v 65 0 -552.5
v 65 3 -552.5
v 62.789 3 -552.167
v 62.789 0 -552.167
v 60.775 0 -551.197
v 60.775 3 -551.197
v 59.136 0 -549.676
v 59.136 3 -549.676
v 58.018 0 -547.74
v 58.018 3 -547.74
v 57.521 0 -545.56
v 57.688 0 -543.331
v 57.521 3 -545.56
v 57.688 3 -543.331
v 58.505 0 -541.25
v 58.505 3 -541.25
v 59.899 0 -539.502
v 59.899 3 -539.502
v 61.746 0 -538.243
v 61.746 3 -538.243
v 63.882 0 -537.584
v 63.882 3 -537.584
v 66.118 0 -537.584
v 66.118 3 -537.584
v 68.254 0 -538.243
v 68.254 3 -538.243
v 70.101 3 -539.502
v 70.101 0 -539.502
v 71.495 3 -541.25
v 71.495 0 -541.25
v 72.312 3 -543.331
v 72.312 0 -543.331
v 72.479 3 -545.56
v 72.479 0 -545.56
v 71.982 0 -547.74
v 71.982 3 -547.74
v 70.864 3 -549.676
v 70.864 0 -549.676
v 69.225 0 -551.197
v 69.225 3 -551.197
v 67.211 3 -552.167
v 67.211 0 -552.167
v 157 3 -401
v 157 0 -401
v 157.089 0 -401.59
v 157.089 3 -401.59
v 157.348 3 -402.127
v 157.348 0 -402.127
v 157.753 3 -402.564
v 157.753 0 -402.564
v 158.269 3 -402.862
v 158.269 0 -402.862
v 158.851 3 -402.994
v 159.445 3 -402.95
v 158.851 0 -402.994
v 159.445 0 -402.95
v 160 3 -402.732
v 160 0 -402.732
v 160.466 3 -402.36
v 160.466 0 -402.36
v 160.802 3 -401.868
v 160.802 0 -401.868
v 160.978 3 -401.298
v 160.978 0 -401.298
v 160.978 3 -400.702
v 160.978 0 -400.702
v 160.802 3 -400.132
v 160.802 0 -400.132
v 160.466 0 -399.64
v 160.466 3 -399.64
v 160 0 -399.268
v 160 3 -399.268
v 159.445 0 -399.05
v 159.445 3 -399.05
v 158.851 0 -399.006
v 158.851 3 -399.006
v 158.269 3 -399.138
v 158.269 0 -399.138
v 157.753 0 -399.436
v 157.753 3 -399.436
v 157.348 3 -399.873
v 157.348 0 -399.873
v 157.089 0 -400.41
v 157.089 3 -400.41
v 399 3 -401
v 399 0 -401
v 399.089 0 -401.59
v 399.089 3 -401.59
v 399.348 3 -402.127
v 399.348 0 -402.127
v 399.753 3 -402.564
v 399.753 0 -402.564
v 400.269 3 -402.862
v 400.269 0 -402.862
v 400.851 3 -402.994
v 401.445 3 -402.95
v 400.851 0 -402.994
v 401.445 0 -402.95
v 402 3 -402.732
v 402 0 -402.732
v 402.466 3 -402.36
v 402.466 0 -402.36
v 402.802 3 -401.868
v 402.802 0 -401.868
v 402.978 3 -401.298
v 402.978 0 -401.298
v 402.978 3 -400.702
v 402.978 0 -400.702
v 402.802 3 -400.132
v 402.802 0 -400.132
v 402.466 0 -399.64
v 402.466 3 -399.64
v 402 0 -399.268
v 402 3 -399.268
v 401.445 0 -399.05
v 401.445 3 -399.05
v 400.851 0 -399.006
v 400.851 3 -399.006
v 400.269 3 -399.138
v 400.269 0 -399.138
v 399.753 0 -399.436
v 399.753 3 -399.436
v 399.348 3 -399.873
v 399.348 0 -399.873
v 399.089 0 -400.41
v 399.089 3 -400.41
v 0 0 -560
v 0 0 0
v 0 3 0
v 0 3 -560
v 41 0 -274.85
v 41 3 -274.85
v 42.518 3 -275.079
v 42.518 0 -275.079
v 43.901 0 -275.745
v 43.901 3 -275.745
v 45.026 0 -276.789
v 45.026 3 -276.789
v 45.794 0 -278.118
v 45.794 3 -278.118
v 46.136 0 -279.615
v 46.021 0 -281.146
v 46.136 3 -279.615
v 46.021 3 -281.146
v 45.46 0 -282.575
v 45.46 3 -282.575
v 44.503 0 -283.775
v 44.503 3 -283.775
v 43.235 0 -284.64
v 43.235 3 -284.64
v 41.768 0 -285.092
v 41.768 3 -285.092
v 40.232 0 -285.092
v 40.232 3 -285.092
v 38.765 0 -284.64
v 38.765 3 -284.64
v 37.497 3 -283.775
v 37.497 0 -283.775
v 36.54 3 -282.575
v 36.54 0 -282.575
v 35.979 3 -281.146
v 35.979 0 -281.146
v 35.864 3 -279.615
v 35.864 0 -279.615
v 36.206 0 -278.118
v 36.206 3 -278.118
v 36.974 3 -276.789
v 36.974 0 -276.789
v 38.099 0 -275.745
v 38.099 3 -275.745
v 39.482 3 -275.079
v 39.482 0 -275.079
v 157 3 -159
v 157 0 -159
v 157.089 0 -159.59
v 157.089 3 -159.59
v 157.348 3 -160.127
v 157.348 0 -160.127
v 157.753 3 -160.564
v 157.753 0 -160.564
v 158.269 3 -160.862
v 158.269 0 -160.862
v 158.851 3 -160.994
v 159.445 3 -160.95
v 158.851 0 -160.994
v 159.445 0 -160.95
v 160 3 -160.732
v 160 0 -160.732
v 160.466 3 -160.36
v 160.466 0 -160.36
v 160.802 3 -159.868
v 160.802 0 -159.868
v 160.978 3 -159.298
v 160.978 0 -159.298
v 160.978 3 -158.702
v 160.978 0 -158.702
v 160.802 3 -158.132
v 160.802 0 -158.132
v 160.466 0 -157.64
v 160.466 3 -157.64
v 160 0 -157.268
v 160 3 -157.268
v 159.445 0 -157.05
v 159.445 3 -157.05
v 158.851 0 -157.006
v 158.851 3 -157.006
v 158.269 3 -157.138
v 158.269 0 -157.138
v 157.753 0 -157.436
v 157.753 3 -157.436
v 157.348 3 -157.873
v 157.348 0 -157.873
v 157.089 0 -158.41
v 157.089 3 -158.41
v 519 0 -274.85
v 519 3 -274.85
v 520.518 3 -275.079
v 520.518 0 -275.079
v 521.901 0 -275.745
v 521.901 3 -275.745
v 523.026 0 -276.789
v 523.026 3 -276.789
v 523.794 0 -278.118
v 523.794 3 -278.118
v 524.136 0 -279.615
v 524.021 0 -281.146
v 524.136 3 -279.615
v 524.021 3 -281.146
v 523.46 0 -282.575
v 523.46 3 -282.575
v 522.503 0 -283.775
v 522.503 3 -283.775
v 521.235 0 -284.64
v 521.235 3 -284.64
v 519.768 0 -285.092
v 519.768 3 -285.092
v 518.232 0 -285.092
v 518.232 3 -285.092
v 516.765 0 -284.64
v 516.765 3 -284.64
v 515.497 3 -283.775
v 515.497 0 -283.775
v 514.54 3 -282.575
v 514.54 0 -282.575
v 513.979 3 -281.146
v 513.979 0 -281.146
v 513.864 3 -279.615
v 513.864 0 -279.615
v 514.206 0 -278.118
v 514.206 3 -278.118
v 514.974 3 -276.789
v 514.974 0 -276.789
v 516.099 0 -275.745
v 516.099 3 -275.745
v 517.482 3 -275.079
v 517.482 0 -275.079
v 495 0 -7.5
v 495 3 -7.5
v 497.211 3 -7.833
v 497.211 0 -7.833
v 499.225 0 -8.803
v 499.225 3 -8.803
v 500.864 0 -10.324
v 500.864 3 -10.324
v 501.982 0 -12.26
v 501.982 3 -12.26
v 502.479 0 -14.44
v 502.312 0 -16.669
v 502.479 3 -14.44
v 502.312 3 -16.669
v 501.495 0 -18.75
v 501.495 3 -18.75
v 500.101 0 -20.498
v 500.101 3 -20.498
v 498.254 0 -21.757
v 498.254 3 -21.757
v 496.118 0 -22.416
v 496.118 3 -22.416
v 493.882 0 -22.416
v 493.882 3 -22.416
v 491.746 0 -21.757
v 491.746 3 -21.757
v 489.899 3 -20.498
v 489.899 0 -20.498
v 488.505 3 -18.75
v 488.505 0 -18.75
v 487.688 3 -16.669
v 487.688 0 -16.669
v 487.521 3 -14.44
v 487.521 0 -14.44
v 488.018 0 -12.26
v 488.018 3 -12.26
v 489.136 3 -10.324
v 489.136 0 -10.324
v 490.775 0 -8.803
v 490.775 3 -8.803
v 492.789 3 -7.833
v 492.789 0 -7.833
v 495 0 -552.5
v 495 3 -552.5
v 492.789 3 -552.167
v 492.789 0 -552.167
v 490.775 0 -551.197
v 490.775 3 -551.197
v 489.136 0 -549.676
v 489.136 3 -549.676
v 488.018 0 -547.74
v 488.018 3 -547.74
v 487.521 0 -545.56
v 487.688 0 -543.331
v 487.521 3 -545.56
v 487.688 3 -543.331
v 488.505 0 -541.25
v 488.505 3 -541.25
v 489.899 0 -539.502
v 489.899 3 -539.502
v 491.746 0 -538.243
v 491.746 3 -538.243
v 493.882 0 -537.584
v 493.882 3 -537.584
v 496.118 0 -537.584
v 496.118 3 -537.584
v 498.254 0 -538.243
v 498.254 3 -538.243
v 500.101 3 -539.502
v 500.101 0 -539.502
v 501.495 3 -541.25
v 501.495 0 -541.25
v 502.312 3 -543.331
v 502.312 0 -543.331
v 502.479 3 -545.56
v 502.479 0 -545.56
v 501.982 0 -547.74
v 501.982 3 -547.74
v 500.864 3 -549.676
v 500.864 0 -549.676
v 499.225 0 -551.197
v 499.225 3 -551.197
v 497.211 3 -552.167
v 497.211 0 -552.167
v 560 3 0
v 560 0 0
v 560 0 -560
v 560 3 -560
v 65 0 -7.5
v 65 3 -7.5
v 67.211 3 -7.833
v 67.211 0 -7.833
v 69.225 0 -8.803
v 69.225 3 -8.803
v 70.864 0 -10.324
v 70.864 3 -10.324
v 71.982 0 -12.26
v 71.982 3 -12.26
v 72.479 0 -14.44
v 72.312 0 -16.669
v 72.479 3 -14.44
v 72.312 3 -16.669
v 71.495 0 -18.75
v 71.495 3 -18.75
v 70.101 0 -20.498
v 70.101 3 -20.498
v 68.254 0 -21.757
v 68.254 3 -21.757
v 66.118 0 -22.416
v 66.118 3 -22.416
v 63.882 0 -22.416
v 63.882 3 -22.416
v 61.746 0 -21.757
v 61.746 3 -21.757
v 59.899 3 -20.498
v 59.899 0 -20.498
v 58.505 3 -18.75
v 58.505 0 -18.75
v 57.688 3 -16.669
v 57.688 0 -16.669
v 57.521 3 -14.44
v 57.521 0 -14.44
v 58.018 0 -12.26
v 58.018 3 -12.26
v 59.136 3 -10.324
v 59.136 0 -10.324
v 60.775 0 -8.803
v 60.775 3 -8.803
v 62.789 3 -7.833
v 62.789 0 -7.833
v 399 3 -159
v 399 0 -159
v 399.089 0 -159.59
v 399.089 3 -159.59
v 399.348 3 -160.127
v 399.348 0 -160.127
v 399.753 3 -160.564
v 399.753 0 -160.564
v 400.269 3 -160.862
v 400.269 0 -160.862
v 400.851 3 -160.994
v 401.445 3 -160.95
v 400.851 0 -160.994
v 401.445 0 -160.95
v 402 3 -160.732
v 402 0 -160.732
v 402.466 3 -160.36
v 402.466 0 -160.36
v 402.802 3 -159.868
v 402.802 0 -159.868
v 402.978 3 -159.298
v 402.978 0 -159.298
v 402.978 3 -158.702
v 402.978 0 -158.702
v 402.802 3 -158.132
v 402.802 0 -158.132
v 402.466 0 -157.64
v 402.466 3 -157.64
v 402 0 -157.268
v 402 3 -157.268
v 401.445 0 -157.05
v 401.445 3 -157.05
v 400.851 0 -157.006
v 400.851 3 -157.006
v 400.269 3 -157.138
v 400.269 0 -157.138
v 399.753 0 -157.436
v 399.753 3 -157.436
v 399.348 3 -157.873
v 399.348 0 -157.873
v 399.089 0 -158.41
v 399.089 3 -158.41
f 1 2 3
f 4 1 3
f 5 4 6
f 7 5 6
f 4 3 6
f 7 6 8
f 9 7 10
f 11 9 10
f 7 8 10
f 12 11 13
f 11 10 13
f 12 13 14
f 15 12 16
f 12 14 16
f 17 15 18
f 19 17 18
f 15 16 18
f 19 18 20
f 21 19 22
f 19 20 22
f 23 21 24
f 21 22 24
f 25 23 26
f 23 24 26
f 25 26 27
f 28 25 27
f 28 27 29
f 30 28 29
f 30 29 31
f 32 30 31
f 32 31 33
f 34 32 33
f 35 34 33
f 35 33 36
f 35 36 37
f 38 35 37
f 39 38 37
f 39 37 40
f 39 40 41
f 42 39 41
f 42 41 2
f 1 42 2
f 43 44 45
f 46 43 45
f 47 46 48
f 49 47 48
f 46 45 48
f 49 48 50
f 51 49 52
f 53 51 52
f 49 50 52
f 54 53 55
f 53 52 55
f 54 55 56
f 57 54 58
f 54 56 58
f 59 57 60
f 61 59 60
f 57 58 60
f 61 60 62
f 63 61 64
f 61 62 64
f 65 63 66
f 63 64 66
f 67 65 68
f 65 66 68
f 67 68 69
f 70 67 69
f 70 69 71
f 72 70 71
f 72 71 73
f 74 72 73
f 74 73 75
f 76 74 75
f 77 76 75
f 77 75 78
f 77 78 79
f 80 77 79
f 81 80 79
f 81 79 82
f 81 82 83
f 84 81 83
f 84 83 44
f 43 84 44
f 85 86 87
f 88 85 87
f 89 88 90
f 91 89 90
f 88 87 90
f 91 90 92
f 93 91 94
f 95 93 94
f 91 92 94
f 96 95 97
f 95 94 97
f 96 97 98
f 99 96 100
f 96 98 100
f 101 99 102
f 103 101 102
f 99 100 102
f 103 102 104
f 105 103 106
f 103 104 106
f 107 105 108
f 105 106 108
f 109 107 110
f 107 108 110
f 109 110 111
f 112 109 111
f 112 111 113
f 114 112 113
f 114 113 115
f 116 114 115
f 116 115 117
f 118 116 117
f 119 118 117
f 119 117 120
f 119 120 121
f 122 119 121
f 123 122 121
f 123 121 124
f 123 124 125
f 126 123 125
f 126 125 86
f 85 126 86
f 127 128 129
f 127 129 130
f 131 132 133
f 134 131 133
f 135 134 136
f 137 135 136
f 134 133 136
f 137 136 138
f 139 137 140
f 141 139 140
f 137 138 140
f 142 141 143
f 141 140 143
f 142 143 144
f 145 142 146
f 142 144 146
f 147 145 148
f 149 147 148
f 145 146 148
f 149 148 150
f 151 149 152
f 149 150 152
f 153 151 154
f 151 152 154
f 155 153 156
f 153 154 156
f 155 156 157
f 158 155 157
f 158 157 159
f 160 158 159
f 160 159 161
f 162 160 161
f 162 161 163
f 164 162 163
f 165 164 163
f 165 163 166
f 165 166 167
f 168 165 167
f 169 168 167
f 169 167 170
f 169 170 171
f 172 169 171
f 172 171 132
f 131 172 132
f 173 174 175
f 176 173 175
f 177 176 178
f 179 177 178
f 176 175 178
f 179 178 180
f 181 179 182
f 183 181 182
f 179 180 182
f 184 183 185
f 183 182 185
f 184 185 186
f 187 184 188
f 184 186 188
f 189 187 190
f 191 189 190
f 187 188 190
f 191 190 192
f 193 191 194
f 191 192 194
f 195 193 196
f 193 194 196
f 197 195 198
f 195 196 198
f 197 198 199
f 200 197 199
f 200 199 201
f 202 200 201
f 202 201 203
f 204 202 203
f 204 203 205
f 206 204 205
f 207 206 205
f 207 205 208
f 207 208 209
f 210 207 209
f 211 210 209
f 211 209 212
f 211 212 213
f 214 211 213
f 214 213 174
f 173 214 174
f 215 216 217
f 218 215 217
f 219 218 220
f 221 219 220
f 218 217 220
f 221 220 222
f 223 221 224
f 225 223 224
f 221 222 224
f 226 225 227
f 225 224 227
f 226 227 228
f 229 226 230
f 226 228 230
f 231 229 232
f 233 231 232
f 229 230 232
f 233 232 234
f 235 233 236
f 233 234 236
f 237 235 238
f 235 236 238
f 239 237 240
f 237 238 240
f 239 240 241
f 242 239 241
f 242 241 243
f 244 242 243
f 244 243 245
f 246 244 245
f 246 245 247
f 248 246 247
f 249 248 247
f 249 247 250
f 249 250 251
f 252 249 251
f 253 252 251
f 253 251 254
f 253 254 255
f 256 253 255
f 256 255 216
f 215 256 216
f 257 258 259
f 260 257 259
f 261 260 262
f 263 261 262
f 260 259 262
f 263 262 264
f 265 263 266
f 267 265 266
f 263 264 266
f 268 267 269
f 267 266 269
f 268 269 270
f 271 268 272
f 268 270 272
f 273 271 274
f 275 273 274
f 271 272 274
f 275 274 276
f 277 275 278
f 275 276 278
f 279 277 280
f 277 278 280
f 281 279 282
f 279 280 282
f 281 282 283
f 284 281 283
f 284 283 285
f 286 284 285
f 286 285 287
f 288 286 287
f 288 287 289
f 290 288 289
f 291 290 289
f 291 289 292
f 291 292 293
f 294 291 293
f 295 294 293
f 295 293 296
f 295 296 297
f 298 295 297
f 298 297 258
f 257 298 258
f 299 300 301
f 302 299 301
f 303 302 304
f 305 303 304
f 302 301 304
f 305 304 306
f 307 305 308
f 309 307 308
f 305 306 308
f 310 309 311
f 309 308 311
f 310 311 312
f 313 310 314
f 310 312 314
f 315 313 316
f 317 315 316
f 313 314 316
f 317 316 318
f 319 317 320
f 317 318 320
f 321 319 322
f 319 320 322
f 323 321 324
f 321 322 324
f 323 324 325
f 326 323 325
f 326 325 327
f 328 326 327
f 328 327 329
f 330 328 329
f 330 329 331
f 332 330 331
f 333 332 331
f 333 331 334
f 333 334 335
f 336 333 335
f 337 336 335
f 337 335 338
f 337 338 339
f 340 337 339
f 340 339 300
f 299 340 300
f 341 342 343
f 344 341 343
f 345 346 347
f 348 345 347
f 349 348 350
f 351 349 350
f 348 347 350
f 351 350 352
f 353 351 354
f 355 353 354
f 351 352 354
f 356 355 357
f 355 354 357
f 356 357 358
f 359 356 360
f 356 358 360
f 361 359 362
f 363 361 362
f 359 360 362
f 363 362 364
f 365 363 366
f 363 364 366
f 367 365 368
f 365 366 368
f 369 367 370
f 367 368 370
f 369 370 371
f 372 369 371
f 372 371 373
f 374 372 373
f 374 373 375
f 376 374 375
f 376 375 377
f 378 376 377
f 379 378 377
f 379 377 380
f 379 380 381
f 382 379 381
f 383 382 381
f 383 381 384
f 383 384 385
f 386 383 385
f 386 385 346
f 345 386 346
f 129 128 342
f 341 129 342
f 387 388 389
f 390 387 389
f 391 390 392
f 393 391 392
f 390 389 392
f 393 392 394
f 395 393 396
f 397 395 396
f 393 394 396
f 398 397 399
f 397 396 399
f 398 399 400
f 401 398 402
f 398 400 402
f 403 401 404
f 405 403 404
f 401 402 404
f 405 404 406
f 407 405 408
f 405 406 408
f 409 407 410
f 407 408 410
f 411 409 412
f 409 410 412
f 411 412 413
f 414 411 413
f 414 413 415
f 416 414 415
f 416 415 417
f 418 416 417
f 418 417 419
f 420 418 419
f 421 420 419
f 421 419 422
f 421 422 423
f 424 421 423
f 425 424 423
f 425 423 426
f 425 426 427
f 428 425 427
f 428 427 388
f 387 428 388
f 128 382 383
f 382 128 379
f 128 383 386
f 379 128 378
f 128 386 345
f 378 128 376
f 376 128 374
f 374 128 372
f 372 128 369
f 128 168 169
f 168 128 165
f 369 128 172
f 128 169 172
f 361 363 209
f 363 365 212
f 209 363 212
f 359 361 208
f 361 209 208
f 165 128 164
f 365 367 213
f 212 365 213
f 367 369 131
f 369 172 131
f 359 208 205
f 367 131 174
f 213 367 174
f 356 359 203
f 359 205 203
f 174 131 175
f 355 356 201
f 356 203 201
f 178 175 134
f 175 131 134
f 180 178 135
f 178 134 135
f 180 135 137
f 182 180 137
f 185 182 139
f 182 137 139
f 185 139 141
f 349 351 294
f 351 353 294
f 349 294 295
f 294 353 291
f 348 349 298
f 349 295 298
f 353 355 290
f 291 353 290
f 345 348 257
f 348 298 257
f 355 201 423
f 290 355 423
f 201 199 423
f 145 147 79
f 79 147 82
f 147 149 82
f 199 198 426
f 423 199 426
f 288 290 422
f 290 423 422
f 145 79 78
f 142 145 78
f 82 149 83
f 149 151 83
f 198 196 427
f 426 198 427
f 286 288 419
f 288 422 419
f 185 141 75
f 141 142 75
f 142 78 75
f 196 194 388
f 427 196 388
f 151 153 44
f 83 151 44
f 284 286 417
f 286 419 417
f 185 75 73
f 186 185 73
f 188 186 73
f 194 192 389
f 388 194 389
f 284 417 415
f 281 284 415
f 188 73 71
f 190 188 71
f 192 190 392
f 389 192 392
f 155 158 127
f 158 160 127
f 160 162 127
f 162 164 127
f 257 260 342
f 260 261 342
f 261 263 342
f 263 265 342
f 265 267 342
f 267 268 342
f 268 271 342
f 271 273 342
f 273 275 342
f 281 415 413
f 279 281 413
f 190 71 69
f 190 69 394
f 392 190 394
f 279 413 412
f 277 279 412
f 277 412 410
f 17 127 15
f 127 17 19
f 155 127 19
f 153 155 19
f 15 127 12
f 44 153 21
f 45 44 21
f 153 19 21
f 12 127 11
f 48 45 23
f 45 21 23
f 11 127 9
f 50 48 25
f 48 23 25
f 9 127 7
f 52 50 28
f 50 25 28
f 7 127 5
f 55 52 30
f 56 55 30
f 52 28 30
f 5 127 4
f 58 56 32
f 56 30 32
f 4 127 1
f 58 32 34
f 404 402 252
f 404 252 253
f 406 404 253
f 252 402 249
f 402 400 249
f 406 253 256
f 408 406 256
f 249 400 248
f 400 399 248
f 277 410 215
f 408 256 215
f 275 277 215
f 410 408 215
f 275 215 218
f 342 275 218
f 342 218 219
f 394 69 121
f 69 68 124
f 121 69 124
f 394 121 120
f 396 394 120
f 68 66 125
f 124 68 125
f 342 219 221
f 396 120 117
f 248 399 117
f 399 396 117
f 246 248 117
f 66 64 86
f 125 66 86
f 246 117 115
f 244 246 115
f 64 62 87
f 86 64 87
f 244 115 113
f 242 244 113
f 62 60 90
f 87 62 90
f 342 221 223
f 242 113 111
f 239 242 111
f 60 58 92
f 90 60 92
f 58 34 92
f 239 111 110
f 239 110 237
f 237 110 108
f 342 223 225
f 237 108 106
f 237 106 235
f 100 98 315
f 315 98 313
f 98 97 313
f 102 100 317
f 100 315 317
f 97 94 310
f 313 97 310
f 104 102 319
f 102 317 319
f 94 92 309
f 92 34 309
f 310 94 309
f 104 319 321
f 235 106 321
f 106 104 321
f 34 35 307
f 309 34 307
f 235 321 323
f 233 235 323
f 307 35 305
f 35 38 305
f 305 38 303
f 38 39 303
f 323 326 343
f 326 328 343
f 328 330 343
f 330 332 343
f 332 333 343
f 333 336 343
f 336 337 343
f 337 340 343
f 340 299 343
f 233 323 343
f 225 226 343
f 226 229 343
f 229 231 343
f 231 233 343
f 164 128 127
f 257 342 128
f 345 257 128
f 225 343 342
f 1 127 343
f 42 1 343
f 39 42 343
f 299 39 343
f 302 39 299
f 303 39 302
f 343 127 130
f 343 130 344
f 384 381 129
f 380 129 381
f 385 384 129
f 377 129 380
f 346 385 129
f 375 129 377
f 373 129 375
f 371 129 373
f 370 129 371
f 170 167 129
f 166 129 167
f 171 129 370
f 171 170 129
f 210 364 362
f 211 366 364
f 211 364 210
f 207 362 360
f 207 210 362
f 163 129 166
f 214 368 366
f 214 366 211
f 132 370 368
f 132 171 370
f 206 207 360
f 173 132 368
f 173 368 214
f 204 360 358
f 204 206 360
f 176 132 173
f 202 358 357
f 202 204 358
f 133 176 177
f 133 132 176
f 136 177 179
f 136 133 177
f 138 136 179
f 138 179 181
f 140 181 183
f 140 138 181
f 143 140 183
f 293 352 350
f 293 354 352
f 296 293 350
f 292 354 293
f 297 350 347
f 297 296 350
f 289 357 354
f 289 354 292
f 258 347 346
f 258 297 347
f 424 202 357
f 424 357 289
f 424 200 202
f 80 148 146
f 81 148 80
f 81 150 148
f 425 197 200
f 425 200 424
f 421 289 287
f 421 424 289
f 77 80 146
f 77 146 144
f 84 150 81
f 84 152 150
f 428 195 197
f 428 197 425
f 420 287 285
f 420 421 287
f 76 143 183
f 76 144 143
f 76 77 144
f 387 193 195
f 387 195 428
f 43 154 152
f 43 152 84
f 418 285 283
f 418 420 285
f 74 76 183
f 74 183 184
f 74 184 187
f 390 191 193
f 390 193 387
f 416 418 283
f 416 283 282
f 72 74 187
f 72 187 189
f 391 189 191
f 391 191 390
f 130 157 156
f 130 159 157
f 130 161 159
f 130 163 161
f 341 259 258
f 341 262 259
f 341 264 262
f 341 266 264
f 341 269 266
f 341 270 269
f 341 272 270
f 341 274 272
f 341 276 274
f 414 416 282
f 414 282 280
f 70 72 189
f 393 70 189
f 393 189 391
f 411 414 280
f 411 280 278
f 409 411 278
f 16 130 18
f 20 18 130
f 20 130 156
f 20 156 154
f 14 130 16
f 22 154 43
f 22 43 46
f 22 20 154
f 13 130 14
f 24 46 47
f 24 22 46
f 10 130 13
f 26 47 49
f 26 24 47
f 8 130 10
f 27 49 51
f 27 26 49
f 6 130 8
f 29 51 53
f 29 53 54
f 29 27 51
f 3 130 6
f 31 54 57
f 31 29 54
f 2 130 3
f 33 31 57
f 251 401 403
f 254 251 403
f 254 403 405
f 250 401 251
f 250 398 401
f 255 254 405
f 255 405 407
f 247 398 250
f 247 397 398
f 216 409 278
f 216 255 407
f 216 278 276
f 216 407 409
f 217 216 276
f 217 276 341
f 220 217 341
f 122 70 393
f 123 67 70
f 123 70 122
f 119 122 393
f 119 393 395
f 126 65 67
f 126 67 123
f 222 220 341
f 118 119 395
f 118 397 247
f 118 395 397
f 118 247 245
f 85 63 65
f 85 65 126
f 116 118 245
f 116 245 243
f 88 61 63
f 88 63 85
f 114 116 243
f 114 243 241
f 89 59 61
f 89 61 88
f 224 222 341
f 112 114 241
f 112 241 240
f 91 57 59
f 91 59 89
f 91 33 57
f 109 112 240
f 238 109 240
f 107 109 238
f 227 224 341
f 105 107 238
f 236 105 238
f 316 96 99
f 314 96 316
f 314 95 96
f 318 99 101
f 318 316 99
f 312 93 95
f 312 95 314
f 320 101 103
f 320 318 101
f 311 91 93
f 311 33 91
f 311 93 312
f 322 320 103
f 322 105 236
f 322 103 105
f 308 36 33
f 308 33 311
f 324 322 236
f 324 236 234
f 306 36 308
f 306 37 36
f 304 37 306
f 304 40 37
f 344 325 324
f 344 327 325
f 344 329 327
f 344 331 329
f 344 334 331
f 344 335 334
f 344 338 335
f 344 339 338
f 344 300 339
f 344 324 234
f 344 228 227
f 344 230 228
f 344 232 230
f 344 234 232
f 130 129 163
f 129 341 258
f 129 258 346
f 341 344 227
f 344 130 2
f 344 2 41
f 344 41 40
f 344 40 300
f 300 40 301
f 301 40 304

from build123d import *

# Parameters (mm, degrees)
SKETCH1_W             = 560
SKETCH1_H             = 560
BOSS_EXTRUDE1_DEPTH   = 3
F_4_0MM_DOWEL_HOLE1_D = 4
SKETCH5_R             = 5.15
CUT_EXTRUDE1_DEPTH    = 10
SKETCH6_R             = 7.5
CUT_EXTRUDE2_DEPTH    = 10


with BuildPart() as part:
    # Sketch1 → Boss-Extrude1 (new body)
    with BuildSketch(Plane(origin=(0, 0, 0), x_dir=(1, 0, 0), z_dir=(0, 1, 0))):
        with Locations((280, 280)):
            Rectangle(SKETCH1_W, SKETCH1_H)
    extrude(amount=BOSS_EXTRUDE1_DEPTH)

    # Ø4.0mm Dowel Hole1 (through all)
    with Locations(Plane(origin=(0, 3, 0), x_dir=(1, 0, 0), z_dir=(0, 1, 0))):
        with Locations((159, 159), (401, 159), (401, 401), (159, 401)):
            Hole(F_4_0MM_DOWEL_HOLE1_D / 2)

    # Sketch5 → Cut-Extrude1 (cut)
    with BuildSketch(Plane(origin=(0, 3, 0), x_dir=(1, 0, 0), z_dir=(0, 1, 0))):
        with Locations(Location((41, 280, 0), (0, 0, 270))):
            Circle(SKETCH5_R)
        with Locations(Location((519, 280, 0), (0, 0, 270))):
            Circle(SKETCH5_R)
    extrude(amount=-CUT_EXTRUDE1_DEPTH, mode=Mode.SUBTRACT)

    # Sketch6 → Cut-Extrude2 (cut)
    with BuildSketch(Plane(origin=(0, 3, 0), x_dir=(1, 0, 0), z_dir=(0, 1, 0))):
        with Locations(Location((495, 15, 0), (0, 0, 270))):
            Circle(SKETCH6_R)
        with Locations(Location((65, 15, 0), (0, 0, 270))):
            Circle(SKETCH6_R)
        with Locations(Location((495, 545, 0), (0, 0, 90))):
            Circle(SKETCH6_R)
        with Locations(Location((65, 545, 0), (0, 0, 90))):
            Circle(SKETCH6_R)
    extrude(amount=-CUT_EXTRUDE2_DEPTH, mode=Mode.SUBTRACT)


solid = part.part
